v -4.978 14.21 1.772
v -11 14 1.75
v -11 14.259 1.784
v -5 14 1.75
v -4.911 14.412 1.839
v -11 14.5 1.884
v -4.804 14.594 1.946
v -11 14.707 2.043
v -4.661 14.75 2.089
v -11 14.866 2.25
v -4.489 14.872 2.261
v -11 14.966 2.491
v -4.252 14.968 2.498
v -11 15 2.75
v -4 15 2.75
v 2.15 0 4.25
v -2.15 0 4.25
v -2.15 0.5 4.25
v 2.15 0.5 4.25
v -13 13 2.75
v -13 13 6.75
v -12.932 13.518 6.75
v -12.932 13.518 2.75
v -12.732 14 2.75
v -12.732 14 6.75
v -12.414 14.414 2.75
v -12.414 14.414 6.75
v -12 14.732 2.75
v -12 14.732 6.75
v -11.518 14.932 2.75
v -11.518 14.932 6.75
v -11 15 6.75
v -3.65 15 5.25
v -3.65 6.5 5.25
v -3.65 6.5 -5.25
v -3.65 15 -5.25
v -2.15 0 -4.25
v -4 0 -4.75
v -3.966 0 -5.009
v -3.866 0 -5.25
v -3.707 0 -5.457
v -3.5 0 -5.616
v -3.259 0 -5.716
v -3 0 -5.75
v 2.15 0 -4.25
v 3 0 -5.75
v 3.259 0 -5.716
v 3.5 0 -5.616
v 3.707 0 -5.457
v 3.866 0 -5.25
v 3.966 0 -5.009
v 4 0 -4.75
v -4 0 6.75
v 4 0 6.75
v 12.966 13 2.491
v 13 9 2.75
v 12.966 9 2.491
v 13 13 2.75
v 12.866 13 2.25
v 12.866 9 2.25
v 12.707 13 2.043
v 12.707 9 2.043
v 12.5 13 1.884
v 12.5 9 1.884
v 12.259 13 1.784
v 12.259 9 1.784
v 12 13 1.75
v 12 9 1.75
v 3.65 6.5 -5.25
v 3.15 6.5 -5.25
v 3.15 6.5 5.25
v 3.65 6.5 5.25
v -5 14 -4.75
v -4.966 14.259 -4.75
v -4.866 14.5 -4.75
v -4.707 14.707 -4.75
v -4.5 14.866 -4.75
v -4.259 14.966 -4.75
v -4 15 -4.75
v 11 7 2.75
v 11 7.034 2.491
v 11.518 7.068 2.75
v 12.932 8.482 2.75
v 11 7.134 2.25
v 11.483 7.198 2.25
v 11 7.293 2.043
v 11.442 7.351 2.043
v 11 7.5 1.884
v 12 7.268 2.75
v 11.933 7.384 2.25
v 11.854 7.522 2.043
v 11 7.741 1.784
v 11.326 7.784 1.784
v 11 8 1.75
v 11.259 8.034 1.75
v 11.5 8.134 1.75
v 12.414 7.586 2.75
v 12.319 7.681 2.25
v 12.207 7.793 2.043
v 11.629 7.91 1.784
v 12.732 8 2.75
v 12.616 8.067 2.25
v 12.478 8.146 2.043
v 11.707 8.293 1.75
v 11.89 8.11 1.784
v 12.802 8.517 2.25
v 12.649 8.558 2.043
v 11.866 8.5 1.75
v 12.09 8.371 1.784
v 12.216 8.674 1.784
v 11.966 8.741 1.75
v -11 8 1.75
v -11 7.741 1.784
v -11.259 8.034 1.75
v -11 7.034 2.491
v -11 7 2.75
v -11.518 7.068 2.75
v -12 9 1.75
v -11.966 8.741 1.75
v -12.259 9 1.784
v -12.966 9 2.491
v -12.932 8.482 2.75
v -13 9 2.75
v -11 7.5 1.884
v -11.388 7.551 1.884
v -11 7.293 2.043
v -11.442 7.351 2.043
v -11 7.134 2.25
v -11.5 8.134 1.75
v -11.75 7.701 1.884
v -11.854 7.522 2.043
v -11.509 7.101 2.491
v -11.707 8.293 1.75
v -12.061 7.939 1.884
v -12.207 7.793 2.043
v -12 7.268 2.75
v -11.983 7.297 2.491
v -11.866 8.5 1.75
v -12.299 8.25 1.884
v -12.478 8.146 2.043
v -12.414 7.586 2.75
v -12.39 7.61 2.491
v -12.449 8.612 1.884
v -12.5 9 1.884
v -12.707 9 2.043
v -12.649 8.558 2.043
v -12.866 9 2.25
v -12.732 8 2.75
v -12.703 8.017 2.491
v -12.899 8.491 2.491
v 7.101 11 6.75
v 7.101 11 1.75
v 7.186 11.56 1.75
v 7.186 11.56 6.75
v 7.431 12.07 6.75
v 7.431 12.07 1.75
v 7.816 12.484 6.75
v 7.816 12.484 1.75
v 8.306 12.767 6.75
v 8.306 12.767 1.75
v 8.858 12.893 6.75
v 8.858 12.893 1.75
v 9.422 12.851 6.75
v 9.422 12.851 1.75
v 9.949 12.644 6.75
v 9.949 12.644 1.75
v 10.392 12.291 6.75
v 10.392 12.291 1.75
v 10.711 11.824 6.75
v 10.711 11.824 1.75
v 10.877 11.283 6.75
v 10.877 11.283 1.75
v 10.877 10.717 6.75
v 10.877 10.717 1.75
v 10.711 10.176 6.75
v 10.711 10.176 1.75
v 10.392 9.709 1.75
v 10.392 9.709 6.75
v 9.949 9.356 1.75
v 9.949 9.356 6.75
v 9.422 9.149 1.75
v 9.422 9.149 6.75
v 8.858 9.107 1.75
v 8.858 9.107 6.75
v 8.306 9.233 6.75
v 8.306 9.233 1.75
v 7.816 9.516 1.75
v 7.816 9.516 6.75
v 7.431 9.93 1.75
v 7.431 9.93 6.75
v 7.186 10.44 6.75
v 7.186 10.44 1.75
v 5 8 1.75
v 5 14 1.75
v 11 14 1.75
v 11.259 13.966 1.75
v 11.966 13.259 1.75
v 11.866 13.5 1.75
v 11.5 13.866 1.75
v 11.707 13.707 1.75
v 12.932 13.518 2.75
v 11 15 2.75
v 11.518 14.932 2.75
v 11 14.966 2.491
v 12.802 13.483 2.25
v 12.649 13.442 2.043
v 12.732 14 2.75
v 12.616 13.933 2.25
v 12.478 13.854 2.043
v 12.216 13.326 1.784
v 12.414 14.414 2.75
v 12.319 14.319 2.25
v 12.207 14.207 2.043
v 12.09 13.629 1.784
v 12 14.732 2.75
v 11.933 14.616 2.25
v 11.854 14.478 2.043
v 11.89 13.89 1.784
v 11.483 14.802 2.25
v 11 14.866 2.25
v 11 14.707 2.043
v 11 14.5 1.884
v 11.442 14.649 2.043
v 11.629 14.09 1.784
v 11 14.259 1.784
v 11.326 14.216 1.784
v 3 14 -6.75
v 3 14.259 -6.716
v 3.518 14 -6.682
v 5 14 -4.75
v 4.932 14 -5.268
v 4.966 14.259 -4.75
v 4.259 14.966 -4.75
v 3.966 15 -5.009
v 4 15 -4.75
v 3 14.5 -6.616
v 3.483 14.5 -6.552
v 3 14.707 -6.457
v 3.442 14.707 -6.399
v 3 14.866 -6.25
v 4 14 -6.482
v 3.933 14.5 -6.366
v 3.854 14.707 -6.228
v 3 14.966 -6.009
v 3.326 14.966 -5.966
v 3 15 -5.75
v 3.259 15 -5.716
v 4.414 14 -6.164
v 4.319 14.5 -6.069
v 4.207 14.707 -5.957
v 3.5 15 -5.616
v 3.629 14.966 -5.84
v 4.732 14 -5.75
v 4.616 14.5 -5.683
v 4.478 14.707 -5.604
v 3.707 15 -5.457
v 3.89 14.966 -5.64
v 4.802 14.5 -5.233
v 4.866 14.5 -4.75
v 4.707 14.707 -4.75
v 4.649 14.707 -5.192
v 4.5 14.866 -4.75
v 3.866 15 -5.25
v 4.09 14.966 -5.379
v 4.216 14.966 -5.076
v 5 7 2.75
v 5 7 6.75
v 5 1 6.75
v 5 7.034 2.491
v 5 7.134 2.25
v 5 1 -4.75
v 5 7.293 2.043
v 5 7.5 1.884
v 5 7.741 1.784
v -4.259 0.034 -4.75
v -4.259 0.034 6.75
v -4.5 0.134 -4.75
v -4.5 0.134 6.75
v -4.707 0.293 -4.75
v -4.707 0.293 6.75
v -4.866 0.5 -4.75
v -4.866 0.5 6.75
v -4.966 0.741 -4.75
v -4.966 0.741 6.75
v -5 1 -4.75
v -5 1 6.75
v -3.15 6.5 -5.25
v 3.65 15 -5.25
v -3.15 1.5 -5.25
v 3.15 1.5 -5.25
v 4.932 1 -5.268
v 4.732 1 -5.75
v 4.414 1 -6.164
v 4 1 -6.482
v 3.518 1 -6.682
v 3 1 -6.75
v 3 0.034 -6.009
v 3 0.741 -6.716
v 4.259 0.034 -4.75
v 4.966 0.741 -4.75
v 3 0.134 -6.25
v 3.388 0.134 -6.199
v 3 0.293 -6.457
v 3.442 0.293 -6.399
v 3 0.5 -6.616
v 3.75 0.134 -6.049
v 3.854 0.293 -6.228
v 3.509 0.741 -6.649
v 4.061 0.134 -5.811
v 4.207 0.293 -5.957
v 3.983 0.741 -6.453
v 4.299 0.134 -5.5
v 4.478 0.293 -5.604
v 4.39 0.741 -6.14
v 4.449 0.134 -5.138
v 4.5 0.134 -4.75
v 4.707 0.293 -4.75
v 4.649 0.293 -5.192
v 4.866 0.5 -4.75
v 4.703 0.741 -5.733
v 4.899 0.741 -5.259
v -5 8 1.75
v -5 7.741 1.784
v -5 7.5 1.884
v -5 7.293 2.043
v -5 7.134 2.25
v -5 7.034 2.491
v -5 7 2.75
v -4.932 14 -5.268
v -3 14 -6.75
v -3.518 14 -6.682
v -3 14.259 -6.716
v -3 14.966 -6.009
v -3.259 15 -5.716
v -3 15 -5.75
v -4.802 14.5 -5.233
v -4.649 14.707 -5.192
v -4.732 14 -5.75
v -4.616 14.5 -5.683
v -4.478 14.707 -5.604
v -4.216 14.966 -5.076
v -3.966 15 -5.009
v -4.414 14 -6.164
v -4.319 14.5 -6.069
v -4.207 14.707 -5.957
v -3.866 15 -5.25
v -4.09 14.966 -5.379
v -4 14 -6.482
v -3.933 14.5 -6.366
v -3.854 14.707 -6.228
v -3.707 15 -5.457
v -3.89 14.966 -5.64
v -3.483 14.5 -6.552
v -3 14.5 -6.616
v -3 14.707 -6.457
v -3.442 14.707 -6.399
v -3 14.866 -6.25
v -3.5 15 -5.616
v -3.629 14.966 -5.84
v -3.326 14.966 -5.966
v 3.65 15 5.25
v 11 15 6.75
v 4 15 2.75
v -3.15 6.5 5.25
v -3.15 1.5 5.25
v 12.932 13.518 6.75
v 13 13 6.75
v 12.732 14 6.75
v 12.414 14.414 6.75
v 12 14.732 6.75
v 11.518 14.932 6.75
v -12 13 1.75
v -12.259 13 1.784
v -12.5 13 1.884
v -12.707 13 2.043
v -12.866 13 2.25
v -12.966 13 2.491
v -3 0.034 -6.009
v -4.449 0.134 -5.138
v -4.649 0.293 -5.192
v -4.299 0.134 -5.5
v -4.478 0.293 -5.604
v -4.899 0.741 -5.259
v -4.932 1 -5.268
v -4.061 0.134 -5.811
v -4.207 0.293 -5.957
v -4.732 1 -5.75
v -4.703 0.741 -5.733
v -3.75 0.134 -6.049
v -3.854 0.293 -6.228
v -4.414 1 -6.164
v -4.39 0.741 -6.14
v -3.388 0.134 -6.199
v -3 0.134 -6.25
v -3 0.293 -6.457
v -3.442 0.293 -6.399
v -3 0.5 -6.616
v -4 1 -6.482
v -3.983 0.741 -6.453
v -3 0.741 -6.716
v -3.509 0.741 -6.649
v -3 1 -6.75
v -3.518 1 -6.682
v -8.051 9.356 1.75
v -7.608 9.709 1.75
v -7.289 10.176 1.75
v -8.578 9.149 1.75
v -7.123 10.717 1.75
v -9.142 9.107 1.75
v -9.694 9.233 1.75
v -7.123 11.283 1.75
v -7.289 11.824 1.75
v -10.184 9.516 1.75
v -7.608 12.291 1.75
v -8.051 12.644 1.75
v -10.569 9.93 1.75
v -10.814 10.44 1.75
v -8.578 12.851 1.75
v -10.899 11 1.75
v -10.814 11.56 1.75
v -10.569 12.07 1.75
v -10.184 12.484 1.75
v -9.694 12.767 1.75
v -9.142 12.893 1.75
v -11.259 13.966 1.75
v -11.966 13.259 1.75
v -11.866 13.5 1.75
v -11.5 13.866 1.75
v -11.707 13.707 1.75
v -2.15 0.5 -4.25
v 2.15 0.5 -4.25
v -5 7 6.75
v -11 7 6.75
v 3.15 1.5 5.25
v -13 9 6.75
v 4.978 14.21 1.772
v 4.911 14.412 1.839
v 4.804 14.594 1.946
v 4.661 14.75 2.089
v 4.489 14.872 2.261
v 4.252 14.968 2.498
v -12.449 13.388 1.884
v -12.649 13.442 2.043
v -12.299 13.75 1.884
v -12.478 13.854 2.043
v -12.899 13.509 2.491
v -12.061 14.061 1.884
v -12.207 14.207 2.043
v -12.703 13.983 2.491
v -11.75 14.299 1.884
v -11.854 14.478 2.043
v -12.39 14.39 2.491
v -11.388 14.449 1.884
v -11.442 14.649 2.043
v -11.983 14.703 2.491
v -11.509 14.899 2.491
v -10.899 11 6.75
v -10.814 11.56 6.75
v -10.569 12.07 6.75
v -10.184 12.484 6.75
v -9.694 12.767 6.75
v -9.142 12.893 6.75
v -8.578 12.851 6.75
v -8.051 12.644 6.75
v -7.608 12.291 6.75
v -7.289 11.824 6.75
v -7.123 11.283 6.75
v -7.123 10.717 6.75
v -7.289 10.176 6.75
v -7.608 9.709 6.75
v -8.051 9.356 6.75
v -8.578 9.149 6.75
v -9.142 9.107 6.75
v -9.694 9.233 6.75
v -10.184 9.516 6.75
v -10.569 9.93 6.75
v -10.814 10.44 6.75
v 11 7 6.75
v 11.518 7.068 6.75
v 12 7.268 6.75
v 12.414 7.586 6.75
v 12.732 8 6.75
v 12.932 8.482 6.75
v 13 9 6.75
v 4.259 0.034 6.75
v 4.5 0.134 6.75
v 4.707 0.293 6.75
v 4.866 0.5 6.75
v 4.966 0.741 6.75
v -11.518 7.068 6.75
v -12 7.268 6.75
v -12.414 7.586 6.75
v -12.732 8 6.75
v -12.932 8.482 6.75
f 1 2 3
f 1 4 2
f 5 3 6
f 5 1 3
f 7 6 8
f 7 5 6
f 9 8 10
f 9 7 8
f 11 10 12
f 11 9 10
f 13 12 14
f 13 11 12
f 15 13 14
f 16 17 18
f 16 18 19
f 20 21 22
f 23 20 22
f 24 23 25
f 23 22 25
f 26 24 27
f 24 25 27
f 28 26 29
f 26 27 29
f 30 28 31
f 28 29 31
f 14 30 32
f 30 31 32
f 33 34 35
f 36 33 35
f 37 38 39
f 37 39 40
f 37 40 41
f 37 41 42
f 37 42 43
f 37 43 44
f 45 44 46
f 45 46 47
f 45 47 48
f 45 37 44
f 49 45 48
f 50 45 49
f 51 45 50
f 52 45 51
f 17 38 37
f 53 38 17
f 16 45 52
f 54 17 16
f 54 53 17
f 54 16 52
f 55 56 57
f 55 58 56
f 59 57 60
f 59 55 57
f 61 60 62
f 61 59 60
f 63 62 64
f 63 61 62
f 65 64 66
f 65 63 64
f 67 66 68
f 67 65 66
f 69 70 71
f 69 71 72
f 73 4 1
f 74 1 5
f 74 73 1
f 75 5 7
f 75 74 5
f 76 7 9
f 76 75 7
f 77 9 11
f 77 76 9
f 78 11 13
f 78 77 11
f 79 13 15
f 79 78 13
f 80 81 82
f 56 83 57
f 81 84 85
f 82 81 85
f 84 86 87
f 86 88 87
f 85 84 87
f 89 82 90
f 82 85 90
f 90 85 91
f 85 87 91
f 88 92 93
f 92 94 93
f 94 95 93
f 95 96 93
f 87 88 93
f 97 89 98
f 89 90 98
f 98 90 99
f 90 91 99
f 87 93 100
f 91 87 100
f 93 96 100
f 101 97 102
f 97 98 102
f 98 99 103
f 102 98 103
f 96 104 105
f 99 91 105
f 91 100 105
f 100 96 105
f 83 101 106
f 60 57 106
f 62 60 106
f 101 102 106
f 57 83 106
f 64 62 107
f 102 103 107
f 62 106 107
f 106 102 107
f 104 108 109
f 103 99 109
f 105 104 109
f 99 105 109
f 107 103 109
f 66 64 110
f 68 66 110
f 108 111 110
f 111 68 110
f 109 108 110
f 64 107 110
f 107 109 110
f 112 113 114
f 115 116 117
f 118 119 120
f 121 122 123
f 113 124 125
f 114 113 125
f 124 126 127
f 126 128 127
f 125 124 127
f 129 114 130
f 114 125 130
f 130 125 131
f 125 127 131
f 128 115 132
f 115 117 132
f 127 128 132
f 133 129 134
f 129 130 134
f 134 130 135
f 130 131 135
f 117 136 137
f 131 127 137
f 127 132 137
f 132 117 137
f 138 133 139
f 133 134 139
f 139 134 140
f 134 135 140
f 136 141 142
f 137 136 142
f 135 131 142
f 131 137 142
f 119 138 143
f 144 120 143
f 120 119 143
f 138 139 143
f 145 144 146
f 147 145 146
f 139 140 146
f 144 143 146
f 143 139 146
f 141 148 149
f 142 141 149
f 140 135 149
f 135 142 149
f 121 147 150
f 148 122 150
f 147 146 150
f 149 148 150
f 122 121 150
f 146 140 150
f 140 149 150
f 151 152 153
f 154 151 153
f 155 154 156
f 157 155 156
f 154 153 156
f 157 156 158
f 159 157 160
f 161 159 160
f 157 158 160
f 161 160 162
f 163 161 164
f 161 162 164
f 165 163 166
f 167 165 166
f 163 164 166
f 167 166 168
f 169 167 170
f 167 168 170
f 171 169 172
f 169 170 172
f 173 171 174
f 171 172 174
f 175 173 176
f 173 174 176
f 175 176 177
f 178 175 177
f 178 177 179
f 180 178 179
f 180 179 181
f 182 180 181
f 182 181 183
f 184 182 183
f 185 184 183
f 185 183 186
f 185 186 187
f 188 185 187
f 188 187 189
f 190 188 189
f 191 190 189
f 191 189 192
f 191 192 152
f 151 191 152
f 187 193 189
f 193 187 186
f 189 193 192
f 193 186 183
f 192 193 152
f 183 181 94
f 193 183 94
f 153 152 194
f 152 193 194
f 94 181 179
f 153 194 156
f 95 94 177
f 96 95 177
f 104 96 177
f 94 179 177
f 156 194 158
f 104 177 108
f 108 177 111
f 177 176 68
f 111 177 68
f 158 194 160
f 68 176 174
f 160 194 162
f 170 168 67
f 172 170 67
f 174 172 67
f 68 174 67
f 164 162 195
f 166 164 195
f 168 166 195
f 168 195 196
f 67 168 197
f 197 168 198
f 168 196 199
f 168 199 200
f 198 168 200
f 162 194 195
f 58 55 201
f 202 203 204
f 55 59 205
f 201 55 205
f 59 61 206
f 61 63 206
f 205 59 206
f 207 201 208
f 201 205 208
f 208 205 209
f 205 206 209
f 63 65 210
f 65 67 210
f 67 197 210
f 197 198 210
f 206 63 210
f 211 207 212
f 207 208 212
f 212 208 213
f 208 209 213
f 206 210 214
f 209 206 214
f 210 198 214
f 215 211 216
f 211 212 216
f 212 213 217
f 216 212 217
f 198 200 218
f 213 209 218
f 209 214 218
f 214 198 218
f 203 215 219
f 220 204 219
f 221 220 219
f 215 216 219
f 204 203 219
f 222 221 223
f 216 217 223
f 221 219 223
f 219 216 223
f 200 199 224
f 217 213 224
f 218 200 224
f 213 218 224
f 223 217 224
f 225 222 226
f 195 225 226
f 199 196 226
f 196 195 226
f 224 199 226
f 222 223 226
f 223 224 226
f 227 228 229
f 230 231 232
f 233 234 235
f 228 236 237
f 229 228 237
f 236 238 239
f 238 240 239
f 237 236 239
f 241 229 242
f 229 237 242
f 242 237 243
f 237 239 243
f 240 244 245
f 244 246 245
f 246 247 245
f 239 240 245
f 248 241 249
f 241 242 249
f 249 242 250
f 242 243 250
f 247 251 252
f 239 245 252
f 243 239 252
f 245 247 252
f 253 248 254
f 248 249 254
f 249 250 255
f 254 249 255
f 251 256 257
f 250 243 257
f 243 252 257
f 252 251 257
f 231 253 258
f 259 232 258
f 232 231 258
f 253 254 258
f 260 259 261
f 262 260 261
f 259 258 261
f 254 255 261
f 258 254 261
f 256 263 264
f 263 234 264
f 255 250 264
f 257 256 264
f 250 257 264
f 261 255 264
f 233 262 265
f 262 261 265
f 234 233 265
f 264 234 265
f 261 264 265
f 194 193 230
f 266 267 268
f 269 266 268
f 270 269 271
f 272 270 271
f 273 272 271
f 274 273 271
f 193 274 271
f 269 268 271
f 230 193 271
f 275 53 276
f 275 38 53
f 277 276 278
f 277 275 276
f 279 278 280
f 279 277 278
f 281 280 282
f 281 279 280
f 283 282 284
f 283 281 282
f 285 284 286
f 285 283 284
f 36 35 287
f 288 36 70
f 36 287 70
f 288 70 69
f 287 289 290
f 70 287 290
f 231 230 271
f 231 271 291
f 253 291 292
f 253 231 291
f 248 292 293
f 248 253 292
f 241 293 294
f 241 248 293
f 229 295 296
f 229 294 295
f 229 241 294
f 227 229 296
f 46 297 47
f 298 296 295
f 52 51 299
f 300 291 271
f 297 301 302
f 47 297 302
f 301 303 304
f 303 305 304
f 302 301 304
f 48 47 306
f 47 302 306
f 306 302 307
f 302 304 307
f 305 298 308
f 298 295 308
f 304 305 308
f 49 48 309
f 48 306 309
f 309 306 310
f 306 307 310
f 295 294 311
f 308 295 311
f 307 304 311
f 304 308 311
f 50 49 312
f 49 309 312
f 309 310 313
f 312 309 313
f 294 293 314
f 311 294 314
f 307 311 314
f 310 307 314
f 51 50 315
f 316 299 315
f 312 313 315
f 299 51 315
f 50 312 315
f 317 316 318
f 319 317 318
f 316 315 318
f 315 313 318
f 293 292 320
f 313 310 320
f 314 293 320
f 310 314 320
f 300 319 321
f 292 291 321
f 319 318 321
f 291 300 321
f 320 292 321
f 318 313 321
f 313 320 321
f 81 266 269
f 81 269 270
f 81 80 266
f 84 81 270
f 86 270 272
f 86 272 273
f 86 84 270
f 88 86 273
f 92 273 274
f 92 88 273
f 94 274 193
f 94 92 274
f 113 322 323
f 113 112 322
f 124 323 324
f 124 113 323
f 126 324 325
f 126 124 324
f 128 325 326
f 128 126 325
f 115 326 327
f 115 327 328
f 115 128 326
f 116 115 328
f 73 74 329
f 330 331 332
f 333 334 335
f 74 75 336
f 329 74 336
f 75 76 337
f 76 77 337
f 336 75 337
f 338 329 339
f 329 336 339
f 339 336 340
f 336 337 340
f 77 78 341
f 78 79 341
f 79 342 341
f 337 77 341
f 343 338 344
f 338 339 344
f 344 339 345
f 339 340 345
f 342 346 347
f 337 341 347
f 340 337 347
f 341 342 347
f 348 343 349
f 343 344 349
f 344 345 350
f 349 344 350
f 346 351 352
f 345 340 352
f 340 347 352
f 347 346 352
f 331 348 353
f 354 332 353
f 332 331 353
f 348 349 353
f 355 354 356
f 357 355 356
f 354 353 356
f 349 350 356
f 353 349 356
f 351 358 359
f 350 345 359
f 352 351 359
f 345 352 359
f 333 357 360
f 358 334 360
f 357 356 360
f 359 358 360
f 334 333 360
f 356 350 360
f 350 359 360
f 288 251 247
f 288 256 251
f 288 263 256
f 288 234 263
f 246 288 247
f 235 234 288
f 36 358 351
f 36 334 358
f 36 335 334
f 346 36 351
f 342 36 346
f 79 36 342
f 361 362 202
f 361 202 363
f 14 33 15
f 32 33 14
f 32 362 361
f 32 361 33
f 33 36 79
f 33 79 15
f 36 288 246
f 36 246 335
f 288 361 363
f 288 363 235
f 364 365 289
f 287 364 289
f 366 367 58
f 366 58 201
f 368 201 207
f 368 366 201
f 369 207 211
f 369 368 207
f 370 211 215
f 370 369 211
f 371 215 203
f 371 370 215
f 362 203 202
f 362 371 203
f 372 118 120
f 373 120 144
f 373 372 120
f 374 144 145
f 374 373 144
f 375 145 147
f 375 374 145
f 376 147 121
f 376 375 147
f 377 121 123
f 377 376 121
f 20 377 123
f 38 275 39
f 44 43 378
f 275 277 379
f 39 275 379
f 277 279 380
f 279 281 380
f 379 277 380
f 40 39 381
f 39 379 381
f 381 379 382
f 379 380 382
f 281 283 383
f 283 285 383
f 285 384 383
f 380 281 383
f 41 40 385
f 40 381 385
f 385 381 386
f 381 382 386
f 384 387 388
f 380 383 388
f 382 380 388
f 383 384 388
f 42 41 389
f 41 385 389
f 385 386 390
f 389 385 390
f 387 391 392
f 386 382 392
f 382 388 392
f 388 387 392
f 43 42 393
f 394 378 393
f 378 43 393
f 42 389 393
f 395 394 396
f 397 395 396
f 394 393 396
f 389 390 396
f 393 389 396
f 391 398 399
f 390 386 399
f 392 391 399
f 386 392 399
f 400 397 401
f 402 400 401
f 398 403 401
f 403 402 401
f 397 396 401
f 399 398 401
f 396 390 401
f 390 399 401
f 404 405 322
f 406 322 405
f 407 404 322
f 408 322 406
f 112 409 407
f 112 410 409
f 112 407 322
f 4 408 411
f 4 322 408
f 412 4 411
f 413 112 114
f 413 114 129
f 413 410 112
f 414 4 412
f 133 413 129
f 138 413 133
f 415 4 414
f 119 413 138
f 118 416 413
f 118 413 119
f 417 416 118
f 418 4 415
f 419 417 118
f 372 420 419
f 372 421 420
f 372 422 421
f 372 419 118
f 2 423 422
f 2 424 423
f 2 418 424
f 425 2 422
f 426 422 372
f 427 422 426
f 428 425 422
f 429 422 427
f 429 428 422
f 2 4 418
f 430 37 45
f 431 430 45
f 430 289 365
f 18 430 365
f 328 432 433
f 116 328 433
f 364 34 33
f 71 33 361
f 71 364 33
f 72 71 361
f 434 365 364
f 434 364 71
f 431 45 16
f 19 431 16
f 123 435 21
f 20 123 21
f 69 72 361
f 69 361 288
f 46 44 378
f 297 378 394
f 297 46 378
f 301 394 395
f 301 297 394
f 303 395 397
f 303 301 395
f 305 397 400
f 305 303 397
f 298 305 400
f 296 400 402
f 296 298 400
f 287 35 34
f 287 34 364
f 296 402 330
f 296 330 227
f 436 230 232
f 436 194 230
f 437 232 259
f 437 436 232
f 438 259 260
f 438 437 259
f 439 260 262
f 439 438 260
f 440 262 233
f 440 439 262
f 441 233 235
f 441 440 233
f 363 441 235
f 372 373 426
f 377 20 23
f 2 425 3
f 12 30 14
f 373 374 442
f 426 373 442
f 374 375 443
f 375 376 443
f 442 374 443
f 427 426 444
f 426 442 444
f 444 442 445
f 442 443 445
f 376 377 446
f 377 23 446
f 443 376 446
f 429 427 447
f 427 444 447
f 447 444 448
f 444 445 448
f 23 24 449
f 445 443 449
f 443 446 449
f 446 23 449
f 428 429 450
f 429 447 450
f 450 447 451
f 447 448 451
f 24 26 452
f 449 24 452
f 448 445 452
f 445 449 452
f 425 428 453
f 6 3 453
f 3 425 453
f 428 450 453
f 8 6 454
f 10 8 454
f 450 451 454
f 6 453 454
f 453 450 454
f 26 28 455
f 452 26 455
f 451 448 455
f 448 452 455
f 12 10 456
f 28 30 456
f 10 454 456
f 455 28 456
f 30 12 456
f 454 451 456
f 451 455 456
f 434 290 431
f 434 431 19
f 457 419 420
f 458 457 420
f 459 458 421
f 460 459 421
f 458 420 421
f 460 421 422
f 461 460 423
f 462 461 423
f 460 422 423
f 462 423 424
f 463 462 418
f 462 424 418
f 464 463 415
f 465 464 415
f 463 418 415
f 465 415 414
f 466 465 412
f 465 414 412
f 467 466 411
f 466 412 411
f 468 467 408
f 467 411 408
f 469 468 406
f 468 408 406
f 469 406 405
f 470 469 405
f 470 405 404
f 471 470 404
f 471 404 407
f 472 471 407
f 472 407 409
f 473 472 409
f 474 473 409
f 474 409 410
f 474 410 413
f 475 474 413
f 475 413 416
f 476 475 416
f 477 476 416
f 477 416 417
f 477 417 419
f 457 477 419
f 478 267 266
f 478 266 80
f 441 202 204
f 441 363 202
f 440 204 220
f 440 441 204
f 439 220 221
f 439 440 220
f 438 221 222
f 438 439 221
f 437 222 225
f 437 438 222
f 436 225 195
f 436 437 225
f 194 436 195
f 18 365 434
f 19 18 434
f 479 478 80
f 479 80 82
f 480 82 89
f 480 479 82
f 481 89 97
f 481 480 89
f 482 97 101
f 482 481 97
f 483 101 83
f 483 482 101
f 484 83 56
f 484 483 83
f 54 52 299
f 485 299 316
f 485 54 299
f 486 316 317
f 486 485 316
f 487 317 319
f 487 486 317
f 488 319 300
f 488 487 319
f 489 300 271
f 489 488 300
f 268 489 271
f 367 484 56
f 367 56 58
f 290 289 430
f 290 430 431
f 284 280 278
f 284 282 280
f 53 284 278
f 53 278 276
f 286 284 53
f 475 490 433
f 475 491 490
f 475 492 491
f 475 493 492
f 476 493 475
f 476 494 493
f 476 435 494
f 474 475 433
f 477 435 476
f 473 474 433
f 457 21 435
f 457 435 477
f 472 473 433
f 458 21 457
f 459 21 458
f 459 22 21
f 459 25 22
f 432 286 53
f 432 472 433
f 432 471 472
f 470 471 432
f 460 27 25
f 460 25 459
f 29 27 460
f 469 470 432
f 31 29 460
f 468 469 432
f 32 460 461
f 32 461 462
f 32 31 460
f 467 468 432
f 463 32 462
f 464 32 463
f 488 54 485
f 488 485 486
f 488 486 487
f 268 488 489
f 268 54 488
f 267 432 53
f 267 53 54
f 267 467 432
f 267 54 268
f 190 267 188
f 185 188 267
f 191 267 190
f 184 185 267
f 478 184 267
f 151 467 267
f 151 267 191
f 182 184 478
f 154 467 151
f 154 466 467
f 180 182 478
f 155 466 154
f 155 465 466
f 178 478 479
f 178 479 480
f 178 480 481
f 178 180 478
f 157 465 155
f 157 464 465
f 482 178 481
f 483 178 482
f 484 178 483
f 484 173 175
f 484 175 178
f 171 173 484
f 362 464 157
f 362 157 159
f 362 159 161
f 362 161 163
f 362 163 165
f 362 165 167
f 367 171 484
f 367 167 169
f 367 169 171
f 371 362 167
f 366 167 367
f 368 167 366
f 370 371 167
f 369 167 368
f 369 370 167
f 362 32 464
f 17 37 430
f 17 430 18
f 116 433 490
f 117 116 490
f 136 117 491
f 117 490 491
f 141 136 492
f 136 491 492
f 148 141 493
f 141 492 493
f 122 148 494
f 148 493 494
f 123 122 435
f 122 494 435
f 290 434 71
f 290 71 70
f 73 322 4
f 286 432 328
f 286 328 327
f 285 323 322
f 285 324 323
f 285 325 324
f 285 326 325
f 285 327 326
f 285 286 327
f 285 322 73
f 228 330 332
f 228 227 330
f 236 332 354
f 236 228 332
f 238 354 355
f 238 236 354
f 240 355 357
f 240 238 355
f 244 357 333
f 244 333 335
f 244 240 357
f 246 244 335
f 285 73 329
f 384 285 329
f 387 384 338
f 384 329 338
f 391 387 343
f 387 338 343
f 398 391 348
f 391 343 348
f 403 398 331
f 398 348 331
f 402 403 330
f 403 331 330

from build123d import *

# Parameters (mm, degrees)
SKETCH1_W             = 10
SKETCH1_H             = 13.5
SKETCH1_W_2           = 7.3
SKETCH1_H_2           = 10.5
BOSS_EXTRUDE1_DEPTH   = 15
SKETCH1_3_W           = 0.5
SKETCH1_3_H           = 10.5
BOSS_EXTRUDE2_DEPTH   = 6.5
BOSS_EXTRUDE3_DEPTH   = 5
F_6_CLEARANCE_HOLE1_D = 3.7973
SKETCH5_W             = 6.3
SKETCH5_H             = 10.5
SKETCH5_W_2           = 4.3
SKETCH5_H_2           = 8.5
BOSS_EXTRUDE4_DEPTH   = 1.5
FILLET1_R             = 2
FILLET2_SIZE          = 1
FILLET3_R             = 1


with BuildPart() as part:
    # Sketch1 → Boss-Extrude1 (new body)
    with BuildSketch(Plane(origin=(0, 0, 0), x_dir=(1, 0, 0), z_dir=(0, 1, 0))):
        Rectangle(SKETCH1_W, SKETCH1_H)
        Rectangle(SKETCH1_W_2, SKETCH1_H_2, mode=Mode.SUBTRACT)
    extrude(amount=BOSS_EXTRUDE1_DEPTH)

    # Sketch1<3> → Boss-Extrude2 (add)
    with BuildSketch(Plane(origin=(0, 0, 0), x_dir=(1, 0, 0), z_dir=(0, 1, 0))):
        with Locations((-3.4, 0)):
            Rectangle(SKETCH1_3_W, SKETCH1_3_H)
        with Locations((3.4, 0)):
            Rectangle(SKETCH1_3_W, SKETCH1_3_H)
    extrude(amount=BOSS_EXTRUDE2_DEPTH)

    # Sketch2 → Boss-Extrude3 (add)
    with BuildSketch(Plane.XY.offset(6.75)):
        with BuildLine():
            ThreePointArc((13, 13), (12.414213562, 14.414213562), (11, 15))
            Line((11, 15), (5, 15))
            Line((5, 15), (5, 7))
            Line((5, 7), (11, 7))
            ThreePointArc((11, 7), (12.414213562, 7.585786438), (13, 9))
            Line((13, 9), (13, 13))
        make_face()
        with BuildLine():
            Line((-13, 9), (-13, 13))
            ThreePointArc((-13, 13), (-12.414213562, 14.414213562), (-11, 15))
            Line((-11, 15), (-5, 15))
            Line((-5, 15), (-5, 7))
            Line((-5, 7), (-11, 7))
            ThreePointArc((-11, 7), (-12.414213562, 7.585786438), (-13, 9))
        make_face()
    extrude(amount=-BOSS_EXTRUDE3_DEPTH)

    # #6 Clearance Hole1 (through all)
    with Locations(Plane.XY.offset(6.75)):
        with Locations((-9, 11), (9, 11)):
            Hole(F_6_CLEARANCE_HOLE1_D / 2)

    # Sketch5 → Boss-Extrude4 (add)
    with BuildSketch(Plane.XZ):
        Rectangle(SKETCH5_W, SKETCH5_H)
        Rectangle(SKETCH5_W_2, SKETCH5_H_2, mode=Mode.SUBTRACT)
    extrude(amount=-BOSS_EXTRUDE4_DEPTH)

    # Fillet1
    fillet1_edges = [part.edges().sort_by_distance(p)[0] for p in [
        (-5, 7.5, -6.75),
        (5, 7.5, -6.75),
    ]]
    fillet(fillet1_edges, radius=FILLET1_R)

    # Fillet2
    fillet2_edges = [part.edges().sort_by_distance(p)[0] for p in [
        (0, 1.5, -4.25),
        (2.15, 1.5, 0),
        (0, 1.5, 4.25),
        (-2.15, 1.5, 0),
    ]]
    chamfer(fillet2_edges, length=FILLET2_SIZE - 0.0001)  # a hair under: the kernel refuses the full size

    # Fillet3
    fillet3_edges = [part.edges().sort_by_distance(p)[0] for p in [
        (0, 0, -6.75),
        (0, 15, -6.75),
        (5, 0, 1),
        (-5, 0, 1),
        (-4.414213562, 0, -6.164213562),
        (4.414213562, 0, -6.164213562),
        (5, 15, -1.5),
        (-5, 15, -1.5),
        (-4.414213562, 15, -6.164213562),
        (4.414213562, 15, -6.164213562),
        (8, 7, 1.75),
        (8, 15, 1.75),
        (12.414213562, 14.414213562, 1.75),
        (13, 11, 1.75),
        (12.414213562, 7.585786438, 1.75),
        (-12.414213562, 7.585786438, 1.75),
        (-13, 11, 1.75),
        (-12.414213562, 14.414213562, 1.75),
        (-8, 15, 1.75),
        (-8, 7, 1.75),
    ]]
    fillet(fillet3_edges, radius=FILLET3_R)


solid = part.part
